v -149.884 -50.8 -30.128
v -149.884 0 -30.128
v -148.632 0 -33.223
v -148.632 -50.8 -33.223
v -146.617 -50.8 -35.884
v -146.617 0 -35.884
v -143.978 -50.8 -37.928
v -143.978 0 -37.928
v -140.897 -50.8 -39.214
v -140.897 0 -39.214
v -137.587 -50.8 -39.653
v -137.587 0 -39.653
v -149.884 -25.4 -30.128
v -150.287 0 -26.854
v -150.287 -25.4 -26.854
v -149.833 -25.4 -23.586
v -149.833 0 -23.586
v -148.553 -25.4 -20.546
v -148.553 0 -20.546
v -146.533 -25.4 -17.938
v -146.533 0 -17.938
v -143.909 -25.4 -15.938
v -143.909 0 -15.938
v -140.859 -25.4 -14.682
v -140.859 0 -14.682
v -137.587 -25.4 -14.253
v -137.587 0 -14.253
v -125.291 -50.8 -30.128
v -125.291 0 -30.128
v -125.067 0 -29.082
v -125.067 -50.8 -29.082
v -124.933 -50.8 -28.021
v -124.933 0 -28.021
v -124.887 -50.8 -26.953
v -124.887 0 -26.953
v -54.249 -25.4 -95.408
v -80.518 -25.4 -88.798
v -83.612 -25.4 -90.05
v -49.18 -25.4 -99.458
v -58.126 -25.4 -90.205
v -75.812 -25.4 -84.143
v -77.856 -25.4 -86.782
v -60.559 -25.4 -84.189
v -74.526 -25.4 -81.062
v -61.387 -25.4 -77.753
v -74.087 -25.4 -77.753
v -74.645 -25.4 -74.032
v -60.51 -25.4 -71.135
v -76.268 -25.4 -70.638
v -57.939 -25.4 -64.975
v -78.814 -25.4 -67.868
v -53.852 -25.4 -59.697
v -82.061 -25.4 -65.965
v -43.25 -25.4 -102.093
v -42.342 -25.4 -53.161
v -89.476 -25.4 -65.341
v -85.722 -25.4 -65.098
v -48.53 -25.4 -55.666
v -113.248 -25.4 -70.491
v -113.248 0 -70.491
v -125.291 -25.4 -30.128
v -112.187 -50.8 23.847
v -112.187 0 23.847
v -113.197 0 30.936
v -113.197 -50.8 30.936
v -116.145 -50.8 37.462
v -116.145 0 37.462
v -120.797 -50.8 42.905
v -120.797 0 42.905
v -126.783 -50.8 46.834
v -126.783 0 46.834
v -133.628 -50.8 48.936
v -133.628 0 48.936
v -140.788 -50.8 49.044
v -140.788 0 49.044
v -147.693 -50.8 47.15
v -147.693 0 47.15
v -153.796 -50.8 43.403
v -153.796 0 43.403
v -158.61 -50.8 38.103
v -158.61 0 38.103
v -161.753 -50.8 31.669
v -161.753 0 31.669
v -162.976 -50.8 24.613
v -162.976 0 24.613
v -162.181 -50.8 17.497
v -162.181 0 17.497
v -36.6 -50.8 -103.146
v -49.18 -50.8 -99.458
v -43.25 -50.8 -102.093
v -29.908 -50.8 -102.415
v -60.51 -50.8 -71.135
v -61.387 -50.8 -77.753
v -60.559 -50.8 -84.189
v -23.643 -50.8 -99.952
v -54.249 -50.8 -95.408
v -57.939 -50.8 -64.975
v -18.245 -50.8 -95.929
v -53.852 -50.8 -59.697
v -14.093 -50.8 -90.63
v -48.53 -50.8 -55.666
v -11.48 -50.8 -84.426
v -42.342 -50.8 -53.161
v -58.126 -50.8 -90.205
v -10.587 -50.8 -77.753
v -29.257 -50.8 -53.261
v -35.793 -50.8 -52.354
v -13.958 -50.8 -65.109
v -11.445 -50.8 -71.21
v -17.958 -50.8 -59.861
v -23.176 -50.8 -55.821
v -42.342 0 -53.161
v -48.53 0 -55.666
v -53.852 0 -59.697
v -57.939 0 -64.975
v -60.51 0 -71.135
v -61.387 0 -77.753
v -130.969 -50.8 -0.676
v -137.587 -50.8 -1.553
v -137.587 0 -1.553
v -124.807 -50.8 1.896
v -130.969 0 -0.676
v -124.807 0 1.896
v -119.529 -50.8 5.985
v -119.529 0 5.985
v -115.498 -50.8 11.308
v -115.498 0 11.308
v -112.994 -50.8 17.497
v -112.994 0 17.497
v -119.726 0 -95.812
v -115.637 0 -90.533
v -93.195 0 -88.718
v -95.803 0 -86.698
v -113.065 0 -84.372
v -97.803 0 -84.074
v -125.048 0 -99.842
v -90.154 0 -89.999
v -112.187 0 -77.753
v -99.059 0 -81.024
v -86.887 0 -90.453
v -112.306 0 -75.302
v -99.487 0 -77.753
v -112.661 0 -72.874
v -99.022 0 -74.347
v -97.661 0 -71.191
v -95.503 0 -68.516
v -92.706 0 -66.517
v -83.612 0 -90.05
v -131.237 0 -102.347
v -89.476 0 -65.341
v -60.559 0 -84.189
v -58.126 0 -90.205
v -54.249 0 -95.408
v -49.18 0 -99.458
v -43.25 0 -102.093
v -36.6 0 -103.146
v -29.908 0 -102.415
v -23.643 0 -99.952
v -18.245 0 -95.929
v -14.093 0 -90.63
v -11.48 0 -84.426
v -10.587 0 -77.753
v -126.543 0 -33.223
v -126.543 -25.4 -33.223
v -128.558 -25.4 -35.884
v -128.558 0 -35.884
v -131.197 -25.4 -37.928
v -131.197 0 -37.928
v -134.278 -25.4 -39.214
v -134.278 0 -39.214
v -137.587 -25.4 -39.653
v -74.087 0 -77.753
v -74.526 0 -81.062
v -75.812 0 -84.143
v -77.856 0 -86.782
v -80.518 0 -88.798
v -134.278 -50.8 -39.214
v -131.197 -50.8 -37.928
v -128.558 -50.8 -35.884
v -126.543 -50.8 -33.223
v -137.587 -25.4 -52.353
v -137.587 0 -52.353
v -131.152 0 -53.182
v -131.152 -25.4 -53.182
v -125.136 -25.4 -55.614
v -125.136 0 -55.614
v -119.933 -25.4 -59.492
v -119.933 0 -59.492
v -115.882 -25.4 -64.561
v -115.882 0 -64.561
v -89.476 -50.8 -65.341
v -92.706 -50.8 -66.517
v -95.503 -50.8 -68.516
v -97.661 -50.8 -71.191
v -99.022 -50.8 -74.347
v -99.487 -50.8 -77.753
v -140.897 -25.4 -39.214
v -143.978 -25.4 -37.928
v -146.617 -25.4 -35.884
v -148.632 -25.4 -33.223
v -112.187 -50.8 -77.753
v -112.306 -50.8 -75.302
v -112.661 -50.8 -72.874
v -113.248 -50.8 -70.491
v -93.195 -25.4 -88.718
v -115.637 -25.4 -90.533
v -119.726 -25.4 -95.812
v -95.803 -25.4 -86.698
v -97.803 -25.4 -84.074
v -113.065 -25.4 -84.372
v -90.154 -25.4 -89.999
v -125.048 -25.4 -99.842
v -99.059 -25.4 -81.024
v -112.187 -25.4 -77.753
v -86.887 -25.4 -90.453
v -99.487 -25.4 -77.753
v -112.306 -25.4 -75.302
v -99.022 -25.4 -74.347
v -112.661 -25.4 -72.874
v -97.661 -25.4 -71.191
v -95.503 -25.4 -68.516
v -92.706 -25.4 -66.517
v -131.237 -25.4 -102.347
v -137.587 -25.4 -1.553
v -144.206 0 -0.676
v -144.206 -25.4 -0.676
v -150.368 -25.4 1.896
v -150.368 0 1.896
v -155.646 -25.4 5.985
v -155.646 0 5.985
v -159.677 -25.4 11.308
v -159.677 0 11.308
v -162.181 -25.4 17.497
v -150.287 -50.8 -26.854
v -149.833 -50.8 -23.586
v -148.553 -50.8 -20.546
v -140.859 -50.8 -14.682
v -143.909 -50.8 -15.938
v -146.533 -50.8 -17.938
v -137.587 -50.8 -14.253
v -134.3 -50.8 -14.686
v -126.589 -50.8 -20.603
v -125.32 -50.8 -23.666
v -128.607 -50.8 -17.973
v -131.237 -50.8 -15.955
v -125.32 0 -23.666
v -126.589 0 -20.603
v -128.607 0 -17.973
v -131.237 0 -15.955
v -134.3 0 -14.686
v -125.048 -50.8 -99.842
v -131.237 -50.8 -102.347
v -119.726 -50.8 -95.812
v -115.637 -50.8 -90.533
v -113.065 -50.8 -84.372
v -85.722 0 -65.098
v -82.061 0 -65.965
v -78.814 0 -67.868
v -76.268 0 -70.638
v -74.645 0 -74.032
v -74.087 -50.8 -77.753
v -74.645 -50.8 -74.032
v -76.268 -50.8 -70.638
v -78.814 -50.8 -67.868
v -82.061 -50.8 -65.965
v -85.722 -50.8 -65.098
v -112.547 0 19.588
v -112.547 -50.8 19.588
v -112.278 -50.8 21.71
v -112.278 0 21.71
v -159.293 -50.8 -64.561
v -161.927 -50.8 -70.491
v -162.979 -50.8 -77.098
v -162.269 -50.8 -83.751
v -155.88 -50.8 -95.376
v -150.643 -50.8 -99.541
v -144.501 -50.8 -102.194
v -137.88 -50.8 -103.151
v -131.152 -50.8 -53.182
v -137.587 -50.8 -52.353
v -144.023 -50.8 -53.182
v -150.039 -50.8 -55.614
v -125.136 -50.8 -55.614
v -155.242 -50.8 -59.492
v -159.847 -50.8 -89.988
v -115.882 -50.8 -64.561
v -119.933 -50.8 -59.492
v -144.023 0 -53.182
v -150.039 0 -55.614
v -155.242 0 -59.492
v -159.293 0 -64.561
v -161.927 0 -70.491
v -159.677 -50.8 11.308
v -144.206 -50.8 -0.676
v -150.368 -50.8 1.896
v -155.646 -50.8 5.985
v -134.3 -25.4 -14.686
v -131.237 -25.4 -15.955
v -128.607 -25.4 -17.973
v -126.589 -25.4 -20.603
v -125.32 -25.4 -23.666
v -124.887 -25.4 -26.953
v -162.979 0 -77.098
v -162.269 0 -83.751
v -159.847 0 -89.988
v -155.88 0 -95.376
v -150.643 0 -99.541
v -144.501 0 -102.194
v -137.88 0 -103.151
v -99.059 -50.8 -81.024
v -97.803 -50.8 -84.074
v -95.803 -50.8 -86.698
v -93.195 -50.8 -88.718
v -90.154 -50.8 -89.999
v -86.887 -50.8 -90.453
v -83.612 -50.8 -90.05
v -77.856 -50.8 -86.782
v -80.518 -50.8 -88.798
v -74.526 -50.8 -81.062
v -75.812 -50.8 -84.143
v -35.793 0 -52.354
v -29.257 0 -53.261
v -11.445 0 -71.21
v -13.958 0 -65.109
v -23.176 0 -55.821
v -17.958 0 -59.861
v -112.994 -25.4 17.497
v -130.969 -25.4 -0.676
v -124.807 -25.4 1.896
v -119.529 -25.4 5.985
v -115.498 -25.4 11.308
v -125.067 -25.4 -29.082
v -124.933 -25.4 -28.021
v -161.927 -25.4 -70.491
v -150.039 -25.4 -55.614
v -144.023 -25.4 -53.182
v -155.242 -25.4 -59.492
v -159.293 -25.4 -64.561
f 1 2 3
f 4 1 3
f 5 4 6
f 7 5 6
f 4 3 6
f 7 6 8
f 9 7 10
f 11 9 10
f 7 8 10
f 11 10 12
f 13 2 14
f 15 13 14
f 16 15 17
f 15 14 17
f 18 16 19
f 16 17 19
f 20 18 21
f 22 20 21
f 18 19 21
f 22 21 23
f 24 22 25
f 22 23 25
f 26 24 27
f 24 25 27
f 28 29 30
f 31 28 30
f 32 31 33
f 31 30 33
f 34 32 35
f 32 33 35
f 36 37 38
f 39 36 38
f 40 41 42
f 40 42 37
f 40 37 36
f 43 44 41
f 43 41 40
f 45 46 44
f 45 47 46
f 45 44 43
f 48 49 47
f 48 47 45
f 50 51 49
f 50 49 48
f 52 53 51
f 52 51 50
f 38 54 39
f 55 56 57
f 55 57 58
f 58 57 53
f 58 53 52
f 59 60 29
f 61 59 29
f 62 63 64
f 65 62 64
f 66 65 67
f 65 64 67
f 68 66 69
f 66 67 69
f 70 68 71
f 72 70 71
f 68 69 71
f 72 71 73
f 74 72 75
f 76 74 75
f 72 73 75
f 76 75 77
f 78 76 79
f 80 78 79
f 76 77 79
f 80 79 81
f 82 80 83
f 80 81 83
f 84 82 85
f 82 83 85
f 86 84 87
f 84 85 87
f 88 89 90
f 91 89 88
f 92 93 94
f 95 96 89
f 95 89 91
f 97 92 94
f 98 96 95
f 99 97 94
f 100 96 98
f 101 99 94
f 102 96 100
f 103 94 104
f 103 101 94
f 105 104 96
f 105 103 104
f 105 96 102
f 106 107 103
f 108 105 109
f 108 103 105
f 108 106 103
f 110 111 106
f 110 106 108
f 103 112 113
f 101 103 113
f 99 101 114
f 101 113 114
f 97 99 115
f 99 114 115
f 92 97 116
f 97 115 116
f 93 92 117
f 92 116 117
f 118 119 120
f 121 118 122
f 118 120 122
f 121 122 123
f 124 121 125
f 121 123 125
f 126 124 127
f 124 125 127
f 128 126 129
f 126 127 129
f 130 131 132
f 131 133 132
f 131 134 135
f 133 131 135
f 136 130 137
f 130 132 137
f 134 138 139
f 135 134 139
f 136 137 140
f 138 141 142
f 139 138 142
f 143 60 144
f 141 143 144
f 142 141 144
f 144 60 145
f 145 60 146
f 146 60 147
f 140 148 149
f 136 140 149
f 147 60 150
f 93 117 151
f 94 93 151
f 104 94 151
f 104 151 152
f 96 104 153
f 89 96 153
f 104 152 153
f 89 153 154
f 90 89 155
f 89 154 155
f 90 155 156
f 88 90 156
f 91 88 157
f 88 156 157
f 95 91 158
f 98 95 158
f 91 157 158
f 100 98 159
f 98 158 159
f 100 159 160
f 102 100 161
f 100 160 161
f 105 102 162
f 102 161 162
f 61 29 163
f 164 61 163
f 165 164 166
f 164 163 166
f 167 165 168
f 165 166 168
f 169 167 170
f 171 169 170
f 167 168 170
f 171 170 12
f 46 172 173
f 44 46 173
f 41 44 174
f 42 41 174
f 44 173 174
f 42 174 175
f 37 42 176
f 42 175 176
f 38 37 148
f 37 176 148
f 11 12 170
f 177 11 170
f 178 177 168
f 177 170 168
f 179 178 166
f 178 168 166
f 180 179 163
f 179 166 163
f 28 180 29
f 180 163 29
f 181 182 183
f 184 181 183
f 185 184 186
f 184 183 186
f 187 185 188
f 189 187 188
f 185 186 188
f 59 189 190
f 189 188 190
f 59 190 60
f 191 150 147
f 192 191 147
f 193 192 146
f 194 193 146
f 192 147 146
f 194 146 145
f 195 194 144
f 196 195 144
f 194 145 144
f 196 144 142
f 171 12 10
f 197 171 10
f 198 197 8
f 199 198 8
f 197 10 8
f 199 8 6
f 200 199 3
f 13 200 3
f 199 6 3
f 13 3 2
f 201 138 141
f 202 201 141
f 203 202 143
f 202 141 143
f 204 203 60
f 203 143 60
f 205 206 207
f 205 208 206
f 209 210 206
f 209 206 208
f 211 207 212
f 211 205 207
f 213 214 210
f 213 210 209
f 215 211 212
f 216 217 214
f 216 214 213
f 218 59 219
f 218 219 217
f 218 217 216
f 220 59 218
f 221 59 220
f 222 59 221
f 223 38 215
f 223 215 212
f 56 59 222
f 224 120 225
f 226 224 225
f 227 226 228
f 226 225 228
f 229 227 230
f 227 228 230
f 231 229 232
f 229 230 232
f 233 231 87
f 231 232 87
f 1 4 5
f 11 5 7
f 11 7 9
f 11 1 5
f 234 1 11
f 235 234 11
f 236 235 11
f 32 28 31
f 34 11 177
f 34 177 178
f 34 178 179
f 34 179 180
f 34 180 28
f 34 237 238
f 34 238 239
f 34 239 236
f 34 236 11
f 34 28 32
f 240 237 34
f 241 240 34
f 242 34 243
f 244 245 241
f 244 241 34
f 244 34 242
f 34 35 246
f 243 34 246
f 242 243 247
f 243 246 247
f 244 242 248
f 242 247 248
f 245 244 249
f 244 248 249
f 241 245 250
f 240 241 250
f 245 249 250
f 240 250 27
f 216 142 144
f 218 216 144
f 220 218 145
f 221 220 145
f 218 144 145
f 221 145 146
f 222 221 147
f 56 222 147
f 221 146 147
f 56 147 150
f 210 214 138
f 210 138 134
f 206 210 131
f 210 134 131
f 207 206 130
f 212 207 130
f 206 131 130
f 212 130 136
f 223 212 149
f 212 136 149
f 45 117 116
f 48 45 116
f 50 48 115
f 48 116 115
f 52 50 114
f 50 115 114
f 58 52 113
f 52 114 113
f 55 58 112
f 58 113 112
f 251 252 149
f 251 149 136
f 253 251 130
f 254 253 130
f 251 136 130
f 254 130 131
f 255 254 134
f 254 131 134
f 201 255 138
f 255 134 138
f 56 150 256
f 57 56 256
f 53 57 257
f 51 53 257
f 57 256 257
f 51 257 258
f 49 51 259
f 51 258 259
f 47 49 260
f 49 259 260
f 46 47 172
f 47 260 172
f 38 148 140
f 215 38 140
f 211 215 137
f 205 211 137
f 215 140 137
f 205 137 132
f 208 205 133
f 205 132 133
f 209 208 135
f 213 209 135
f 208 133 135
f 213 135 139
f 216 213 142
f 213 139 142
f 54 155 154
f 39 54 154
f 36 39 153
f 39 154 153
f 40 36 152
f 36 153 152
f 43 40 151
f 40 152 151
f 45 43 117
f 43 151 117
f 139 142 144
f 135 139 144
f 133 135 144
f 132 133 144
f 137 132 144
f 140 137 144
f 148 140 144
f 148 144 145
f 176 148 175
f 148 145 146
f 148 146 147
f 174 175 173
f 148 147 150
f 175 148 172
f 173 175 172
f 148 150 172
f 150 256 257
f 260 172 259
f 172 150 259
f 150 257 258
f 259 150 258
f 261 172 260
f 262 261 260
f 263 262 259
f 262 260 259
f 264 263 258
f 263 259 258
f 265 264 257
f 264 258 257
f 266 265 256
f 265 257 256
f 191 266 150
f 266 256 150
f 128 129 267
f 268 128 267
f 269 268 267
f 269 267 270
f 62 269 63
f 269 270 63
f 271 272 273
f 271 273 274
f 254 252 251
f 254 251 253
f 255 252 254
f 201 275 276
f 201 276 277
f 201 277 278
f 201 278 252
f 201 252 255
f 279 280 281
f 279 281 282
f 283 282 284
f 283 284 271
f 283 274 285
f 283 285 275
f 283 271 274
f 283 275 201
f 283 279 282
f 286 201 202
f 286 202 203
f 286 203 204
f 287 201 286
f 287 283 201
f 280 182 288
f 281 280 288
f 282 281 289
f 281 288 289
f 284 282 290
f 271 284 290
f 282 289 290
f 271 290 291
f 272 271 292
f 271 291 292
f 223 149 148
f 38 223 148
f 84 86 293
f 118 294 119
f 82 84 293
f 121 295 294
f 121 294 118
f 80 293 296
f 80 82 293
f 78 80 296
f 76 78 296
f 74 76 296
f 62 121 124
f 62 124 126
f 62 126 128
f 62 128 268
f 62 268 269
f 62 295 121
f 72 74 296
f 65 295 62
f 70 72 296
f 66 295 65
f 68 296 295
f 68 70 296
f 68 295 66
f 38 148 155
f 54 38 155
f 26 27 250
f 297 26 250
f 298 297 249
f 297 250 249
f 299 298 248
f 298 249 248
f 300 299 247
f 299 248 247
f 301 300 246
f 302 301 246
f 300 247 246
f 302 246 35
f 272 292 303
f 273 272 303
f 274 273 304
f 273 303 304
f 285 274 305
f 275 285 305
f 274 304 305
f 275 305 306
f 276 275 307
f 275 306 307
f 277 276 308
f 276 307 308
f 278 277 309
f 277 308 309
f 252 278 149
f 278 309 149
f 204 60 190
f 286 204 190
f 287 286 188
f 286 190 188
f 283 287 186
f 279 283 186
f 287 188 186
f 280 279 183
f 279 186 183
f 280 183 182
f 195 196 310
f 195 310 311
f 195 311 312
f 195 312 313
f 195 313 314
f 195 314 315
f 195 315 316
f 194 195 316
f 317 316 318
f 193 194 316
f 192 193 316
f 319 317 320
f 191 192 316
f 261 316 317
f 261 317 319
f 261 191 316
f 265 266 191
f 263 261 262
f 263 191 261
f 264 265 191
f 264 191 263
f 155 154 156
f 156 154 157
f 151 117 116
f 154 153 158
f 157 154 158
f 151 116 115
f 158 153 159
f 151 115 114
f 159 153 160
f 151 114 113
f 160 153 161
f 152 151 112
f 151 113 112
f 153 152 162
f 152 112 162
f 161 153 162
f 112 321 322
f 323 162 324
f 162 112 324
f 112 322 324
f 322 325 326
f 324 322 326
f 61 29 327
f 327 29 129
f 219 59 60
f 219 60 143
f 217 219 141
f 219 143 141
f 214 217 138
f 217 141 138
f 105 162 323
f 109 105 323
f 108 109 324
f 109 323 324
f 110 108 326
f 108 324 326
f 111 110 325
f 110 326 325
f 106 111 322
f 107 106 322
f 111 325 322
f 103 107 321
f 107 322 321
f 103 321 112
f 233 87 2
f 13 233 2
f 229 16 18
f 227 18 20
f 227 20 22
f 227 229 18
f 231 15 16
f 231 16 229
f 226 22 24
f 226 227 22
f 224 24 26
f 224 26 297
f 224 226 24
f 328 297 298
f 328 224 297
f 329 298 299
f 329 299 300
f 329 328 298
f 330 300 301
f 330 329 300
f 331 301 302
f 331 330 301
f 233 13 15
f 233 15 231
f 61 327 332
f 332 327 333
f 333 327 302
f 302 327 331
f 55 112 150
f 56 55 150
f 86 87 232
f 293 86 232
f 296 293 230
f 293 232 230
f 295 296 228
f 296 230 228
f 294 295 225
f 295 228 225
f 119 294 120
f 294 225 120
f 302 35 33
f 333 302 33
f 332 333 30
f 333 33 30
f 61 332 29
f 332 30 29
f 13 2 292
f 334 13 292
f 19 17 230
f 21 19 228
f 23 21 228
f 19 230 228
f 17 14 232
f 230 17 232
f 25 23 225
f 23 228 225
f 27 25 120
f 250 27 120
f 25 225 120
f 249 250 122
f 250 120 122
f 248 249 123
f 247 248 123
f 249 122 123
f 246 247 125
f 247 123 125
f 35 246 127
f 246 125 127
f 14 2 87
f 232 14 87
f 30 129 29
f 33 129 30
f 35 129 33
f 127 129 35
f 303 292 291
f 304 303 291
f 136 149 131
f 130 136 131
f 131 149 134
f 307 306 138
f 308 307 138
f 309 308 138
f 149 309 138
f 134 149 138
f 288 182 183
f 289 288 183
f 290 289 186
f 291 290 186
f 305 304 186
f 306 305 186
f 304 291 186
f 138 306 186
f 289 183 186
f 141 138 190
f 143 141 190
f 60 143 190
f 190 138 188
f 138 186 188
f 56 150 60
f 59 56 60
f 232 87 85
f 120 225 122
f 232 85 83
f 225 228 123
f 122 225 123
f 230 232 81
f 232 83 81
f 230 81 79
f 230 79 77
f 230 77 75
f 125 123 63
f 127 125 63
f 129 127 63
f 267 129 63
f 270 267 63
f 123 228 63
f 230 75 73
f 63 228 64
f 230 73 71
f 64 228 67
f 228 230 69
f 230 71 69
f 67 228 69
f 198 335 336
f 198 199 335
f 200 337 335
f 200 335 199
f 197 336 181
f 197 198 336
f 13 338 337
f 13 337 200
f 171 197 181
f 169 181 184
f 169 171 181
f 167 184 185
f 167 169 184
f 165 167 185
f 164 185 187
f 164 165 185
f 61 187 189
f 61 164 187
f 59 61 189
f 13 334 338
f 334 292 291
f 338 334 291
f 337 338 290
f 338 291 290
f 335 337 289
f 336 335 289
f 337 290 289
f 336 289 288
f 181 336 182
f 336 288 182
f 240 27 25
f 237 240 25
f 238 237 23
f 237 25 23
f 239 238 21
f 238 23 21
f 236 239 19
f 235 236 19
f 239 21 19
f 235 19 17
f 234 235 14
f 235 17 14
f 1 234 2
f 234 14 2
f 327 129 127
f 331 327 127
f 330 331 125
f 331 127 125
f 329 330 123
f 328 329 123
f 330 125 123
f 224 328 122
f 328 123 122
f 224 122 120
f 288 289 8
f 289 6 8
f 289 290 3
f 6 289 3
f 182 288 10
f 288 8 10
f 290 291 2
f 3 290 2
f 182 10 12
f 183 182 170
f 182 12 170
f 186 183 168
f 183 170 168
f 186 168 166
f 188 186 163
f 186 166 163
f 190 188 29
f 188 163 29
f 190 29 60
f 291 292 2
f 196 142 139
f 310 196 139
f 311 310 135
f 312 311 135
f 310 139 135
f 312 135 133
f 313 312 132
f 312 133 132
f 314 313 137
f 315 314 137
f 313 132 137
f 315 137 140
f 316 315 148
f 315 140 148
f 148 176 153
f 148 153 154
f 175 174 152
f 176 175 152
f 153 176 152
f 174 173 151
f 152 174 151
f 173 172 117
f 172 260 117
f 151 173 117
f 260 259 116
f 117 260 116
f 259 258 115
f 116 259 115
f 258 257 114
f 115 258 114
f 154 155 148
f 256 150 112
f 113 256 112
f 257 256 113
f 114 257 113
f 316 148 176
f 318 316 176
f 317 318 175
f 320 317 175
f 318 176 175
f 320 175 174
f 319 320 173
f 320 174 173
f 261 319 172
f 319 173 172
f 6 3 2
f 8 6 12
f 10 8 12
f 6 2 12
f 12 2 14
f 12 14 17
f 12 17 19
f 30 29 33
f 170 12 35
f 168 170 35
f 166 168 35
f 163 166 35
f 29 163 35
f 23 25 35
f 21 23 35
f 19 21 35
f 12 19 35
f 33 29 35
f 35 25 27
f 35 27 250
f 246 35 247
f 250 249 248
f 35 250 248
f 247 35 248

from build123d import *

# Parameters (mm, degrees)
F1_DEPTH = 50.8
F2_DEPTH = 25.4


with BuildPart() as f1:
    # F0 (on Front) → F1 (new body)
    with BuildSketch(Plane.XZ):
        with BuildLine():
            ThreePointArc((-137.587486, -1.553076), (-122.033226, 3.766461), (-112.994041, 17.496924))
            ThreePointArc((-112.994041, 17.496924), (-112.389931, 20.646415), (-112.187486, 23.846924))
            ThreePointArc((-112.187486, 23.846924), (-140.787995, 49.044478), (-162.18093, 17.496924))
            ThreePointArc((-162.18093, 17.496924), (-153.141745, 3.766461), (-137.587486, -1.553076))
        make_face()
        with BuildLine():
            ThreePointArc((-149.884208, -30.128076), (-145.364616, -36.993308), (-137.587486, -39.653076))
            Line((-137.587486, -39.653076), (-137.587486, -26.953076))
            Line((-137.587486, -26.953076), (-137.587486, -14.253076))
            ThreePointArc((-137.587486, -14.253076), (-147.627717, -19.175946), (-149.884208, -30.128076))
        make_face()
        with BuildLine():
            Line((-137.587486, -52.353076), (-137.587486, -77.753076))
            Line((-137.587486, -77.753076), (-112.187486, -77.753076))
            ThreePointArc((-112.187486, -77.753076), (-112.45396, -74.083486), (-113.247792, -70.490891))
            ThreePointArc((-113.247792, -70.490891), (-122.410192, -57.386198), (-137.587486, -52.353076))
        make_face()
        with BuildLine():
            Line((-112.187486, -77.753076), (-137.587486, -77.753076))
            Line((-137.587486, -77.753076), (-137.587486, -52.353076))
            ThreePointArc((-137.587486, -52.353076), (-152.76478, -57.386198), (-161.927179, -70.490891))
            ThreePointArc((-161.927179, -70.490891), (-155.87963, -95.375717), (-131.237486, -102.346521))
            ThreePointArc((-131.237486, -102.346521), (-117.507022, -93.307336), (-112.187486, -77.753076))
        make_face()
        with BuildLine():
            Line((-137.587486, -26.953076), (-137.587486, -39.653076))
            ThreePointArc((-137.587486, -39.653076), (-129.810356, -36.993308), (-125.290763, -30.128076))
            ThreePointArc((-125.290763, -30.128076), (-124.988708, -28.553331), (-124.887486, -26.953076))
            ThreePointArc((-124.887486, -26.953076), (-128.607229, -17.97282), (-137.587486, -14.253076))
            Line((-137.587486, -14.253076), (-137.587486, -26.953076))
        make_face()
        with BuildLine():
            ThreePointArc((-89.476467, -65.341011), (-96.67283, -69.779999), (-99.487486, -77.753076))
            Line((-99.487486, -77.753076), (-86.787486, -77.753076))
            Line((-86.787486, -77.753076), (-74.087486, -77.753076))
            ThreePointArc((-74.087486, -77.753076), (-78.814408, -67.867732), (-89.476467, -65.341011))
        make_face()
        with BuildLine():
            Line((-86.787486, -77.753076), (-99.487486, -77.753076))
            ThreePointArc((-99.487486, -77.753076), (-94.564616, -87.793308), (-83.612486, -90.049798))
            ThreePointArc((-83.612486, -90.049798), (-76.747254, -85.530206), (-74.087486, -77.753076))
            Line((-74.087486, -77.753076), (-86.787486, -77.753076))
        make_face()
        with BuildLine():
            ThreePointArc((-10.587486, -77.753076), (-20.435252, -57.671044), (-42.342448, -53.160914))
            ThreePointArc((-42.342448, -53.160914), (-56.069518, -62.200842), (-61.387486, -77.753076))
            ThreePointArc((-61.387486, -77.753076), (-56.354364, -92.93037), (-43.24967, -102.09277))
            ThreePointArc((-43.24967, -102.09277), (-20.810192, -98.119955), (-10.587486, -77.753076))
        make_face()
    extrude(amount=F1_DEPTH)


with BuildPart() as f2:
    # F0 (on Front) → F2 (new body)
    with BuildSketch(Plane.XZ):
        with BuildLine():
            Line((-162.18093, 17.496924), (-149.884208, -30.128076))
            ThreePointArc((-149.884208, -30.128076), (-147.627717, -19.175946), (-137.587486, -14.253076))
            Line((-137.587486, -14.253076), (-137.587486, -1.553076))
            ThreePointArc((-137.587486, -1.553076), (-153.141745, 3.766461), (-162.18093, 17.496924))
        make_face()
        with BuildLine():
            ThreePointArc((-124.887486, -26.953076), (-124.988708, -28.553331), (-125.290763, -30.128076))
            Line((-125.290763, -30.128076), (-112.994041, 17.496924))
            ThreePointArc((-112.994041, 17.496924), (-122.033226, 3.766461), (-137.587486, -1.553076))
            Line((-137.587486, -1.553076), (-137.587486, -14.253076))
            ThreePointArc((-137.587486, -14.253076), (-128.607229, -17.97282), (-124.887486, -26.953076))
        make_face()
        with BuildLine():
            ThreePointArc((-161.927179, -70.490891), (-152.76478, -57.386198), (-137.587486, -52.353076))
            Line((-137.587486, -52.353076), (-137.587486, -39.653076))
            ThreePointArc((-137.587486, -39.653076), (-145.364616, -36.993308), (-149.884208, -30.128076))
            Line((-149.884208, -30.128076), (-161.927179, -70.490891))
        make_face()
        with BuildLine():
            Line((-137.587486, -39.653076), (-137.587486, -52.353076))
            ThreePointArc((-137.587486, -52.353076), (-122.410192, -57.386198), (-113.247792, -70.490891))
            Line((-113.247792, -70.490891), (-125.290763, -30.128076))
            ThreePointArc((-125.290763, -30.128076), (-129.810356, -36.993308), (-137.587486, -39.653076))
        make_face()
        with BuildLine():
            Line((-99.487486, -77.753076), (-112.187486, -77.753076))
            ThreePointArc((-112.187486, -77.753076), (-117.507022, -93.307336), (-131.237486, -102.346521))
            Line((-131.237486, -102.346521), (-83.612486, -90.049798))
            ThreePointArc((-83.612486, -90.049798), (-94.564616, -87.793308), (-99.487486, -77.753076))
        make_face()
        with BuildLine():
            ThreePointArc((-113.247792, -70.490891), (-112.45396, -74.083486), (-112.187486, -77.753076))
            Line((-112.187486, -77.753076), (-99.487486, -77.753076))
            ThreePointArc((-99.487486, -77.753076), (-96.67283, -69.779999), (-89.476467, -65.341011))
            Line((-89.476467, -65.341011), (-113.247792, -70.490891))
        make_face()
        with BuildLine():
            ThreePointArc((-74.087486, -77.753076), (-76.747254, -85.530206), (-83.612486, -90.049798))
            Line((-83.612486, -90.049798), (-43.24967, -102.09277))
            ThreePointArc((-43.24967, -102.09277), (-56.354364, -92.93037), (-61.387486, -77.753076))
            Line((-61.387486, -77.753076), (-74.087486, -77.753076))
        make_face()
        with BuildLine():
            Line((-42.342448, -53.160914), (-89.476467, -65.341011))
            ThreePointArc((-89.476467, -65.341011), (-78.814408, -67.867732), (-74.087486, -77.753076))
            Line((-74.087486, -77.753076), (-61.387486, -77.753076))
            ThreePointArc((-61.387486, -77.753076), (-56.069518, -62.200842), (-42.342448, -53.160914))
        make_face()
    extrude(amount=F2_DEPTH)


solid = Compound([f1.part, f2.part])
